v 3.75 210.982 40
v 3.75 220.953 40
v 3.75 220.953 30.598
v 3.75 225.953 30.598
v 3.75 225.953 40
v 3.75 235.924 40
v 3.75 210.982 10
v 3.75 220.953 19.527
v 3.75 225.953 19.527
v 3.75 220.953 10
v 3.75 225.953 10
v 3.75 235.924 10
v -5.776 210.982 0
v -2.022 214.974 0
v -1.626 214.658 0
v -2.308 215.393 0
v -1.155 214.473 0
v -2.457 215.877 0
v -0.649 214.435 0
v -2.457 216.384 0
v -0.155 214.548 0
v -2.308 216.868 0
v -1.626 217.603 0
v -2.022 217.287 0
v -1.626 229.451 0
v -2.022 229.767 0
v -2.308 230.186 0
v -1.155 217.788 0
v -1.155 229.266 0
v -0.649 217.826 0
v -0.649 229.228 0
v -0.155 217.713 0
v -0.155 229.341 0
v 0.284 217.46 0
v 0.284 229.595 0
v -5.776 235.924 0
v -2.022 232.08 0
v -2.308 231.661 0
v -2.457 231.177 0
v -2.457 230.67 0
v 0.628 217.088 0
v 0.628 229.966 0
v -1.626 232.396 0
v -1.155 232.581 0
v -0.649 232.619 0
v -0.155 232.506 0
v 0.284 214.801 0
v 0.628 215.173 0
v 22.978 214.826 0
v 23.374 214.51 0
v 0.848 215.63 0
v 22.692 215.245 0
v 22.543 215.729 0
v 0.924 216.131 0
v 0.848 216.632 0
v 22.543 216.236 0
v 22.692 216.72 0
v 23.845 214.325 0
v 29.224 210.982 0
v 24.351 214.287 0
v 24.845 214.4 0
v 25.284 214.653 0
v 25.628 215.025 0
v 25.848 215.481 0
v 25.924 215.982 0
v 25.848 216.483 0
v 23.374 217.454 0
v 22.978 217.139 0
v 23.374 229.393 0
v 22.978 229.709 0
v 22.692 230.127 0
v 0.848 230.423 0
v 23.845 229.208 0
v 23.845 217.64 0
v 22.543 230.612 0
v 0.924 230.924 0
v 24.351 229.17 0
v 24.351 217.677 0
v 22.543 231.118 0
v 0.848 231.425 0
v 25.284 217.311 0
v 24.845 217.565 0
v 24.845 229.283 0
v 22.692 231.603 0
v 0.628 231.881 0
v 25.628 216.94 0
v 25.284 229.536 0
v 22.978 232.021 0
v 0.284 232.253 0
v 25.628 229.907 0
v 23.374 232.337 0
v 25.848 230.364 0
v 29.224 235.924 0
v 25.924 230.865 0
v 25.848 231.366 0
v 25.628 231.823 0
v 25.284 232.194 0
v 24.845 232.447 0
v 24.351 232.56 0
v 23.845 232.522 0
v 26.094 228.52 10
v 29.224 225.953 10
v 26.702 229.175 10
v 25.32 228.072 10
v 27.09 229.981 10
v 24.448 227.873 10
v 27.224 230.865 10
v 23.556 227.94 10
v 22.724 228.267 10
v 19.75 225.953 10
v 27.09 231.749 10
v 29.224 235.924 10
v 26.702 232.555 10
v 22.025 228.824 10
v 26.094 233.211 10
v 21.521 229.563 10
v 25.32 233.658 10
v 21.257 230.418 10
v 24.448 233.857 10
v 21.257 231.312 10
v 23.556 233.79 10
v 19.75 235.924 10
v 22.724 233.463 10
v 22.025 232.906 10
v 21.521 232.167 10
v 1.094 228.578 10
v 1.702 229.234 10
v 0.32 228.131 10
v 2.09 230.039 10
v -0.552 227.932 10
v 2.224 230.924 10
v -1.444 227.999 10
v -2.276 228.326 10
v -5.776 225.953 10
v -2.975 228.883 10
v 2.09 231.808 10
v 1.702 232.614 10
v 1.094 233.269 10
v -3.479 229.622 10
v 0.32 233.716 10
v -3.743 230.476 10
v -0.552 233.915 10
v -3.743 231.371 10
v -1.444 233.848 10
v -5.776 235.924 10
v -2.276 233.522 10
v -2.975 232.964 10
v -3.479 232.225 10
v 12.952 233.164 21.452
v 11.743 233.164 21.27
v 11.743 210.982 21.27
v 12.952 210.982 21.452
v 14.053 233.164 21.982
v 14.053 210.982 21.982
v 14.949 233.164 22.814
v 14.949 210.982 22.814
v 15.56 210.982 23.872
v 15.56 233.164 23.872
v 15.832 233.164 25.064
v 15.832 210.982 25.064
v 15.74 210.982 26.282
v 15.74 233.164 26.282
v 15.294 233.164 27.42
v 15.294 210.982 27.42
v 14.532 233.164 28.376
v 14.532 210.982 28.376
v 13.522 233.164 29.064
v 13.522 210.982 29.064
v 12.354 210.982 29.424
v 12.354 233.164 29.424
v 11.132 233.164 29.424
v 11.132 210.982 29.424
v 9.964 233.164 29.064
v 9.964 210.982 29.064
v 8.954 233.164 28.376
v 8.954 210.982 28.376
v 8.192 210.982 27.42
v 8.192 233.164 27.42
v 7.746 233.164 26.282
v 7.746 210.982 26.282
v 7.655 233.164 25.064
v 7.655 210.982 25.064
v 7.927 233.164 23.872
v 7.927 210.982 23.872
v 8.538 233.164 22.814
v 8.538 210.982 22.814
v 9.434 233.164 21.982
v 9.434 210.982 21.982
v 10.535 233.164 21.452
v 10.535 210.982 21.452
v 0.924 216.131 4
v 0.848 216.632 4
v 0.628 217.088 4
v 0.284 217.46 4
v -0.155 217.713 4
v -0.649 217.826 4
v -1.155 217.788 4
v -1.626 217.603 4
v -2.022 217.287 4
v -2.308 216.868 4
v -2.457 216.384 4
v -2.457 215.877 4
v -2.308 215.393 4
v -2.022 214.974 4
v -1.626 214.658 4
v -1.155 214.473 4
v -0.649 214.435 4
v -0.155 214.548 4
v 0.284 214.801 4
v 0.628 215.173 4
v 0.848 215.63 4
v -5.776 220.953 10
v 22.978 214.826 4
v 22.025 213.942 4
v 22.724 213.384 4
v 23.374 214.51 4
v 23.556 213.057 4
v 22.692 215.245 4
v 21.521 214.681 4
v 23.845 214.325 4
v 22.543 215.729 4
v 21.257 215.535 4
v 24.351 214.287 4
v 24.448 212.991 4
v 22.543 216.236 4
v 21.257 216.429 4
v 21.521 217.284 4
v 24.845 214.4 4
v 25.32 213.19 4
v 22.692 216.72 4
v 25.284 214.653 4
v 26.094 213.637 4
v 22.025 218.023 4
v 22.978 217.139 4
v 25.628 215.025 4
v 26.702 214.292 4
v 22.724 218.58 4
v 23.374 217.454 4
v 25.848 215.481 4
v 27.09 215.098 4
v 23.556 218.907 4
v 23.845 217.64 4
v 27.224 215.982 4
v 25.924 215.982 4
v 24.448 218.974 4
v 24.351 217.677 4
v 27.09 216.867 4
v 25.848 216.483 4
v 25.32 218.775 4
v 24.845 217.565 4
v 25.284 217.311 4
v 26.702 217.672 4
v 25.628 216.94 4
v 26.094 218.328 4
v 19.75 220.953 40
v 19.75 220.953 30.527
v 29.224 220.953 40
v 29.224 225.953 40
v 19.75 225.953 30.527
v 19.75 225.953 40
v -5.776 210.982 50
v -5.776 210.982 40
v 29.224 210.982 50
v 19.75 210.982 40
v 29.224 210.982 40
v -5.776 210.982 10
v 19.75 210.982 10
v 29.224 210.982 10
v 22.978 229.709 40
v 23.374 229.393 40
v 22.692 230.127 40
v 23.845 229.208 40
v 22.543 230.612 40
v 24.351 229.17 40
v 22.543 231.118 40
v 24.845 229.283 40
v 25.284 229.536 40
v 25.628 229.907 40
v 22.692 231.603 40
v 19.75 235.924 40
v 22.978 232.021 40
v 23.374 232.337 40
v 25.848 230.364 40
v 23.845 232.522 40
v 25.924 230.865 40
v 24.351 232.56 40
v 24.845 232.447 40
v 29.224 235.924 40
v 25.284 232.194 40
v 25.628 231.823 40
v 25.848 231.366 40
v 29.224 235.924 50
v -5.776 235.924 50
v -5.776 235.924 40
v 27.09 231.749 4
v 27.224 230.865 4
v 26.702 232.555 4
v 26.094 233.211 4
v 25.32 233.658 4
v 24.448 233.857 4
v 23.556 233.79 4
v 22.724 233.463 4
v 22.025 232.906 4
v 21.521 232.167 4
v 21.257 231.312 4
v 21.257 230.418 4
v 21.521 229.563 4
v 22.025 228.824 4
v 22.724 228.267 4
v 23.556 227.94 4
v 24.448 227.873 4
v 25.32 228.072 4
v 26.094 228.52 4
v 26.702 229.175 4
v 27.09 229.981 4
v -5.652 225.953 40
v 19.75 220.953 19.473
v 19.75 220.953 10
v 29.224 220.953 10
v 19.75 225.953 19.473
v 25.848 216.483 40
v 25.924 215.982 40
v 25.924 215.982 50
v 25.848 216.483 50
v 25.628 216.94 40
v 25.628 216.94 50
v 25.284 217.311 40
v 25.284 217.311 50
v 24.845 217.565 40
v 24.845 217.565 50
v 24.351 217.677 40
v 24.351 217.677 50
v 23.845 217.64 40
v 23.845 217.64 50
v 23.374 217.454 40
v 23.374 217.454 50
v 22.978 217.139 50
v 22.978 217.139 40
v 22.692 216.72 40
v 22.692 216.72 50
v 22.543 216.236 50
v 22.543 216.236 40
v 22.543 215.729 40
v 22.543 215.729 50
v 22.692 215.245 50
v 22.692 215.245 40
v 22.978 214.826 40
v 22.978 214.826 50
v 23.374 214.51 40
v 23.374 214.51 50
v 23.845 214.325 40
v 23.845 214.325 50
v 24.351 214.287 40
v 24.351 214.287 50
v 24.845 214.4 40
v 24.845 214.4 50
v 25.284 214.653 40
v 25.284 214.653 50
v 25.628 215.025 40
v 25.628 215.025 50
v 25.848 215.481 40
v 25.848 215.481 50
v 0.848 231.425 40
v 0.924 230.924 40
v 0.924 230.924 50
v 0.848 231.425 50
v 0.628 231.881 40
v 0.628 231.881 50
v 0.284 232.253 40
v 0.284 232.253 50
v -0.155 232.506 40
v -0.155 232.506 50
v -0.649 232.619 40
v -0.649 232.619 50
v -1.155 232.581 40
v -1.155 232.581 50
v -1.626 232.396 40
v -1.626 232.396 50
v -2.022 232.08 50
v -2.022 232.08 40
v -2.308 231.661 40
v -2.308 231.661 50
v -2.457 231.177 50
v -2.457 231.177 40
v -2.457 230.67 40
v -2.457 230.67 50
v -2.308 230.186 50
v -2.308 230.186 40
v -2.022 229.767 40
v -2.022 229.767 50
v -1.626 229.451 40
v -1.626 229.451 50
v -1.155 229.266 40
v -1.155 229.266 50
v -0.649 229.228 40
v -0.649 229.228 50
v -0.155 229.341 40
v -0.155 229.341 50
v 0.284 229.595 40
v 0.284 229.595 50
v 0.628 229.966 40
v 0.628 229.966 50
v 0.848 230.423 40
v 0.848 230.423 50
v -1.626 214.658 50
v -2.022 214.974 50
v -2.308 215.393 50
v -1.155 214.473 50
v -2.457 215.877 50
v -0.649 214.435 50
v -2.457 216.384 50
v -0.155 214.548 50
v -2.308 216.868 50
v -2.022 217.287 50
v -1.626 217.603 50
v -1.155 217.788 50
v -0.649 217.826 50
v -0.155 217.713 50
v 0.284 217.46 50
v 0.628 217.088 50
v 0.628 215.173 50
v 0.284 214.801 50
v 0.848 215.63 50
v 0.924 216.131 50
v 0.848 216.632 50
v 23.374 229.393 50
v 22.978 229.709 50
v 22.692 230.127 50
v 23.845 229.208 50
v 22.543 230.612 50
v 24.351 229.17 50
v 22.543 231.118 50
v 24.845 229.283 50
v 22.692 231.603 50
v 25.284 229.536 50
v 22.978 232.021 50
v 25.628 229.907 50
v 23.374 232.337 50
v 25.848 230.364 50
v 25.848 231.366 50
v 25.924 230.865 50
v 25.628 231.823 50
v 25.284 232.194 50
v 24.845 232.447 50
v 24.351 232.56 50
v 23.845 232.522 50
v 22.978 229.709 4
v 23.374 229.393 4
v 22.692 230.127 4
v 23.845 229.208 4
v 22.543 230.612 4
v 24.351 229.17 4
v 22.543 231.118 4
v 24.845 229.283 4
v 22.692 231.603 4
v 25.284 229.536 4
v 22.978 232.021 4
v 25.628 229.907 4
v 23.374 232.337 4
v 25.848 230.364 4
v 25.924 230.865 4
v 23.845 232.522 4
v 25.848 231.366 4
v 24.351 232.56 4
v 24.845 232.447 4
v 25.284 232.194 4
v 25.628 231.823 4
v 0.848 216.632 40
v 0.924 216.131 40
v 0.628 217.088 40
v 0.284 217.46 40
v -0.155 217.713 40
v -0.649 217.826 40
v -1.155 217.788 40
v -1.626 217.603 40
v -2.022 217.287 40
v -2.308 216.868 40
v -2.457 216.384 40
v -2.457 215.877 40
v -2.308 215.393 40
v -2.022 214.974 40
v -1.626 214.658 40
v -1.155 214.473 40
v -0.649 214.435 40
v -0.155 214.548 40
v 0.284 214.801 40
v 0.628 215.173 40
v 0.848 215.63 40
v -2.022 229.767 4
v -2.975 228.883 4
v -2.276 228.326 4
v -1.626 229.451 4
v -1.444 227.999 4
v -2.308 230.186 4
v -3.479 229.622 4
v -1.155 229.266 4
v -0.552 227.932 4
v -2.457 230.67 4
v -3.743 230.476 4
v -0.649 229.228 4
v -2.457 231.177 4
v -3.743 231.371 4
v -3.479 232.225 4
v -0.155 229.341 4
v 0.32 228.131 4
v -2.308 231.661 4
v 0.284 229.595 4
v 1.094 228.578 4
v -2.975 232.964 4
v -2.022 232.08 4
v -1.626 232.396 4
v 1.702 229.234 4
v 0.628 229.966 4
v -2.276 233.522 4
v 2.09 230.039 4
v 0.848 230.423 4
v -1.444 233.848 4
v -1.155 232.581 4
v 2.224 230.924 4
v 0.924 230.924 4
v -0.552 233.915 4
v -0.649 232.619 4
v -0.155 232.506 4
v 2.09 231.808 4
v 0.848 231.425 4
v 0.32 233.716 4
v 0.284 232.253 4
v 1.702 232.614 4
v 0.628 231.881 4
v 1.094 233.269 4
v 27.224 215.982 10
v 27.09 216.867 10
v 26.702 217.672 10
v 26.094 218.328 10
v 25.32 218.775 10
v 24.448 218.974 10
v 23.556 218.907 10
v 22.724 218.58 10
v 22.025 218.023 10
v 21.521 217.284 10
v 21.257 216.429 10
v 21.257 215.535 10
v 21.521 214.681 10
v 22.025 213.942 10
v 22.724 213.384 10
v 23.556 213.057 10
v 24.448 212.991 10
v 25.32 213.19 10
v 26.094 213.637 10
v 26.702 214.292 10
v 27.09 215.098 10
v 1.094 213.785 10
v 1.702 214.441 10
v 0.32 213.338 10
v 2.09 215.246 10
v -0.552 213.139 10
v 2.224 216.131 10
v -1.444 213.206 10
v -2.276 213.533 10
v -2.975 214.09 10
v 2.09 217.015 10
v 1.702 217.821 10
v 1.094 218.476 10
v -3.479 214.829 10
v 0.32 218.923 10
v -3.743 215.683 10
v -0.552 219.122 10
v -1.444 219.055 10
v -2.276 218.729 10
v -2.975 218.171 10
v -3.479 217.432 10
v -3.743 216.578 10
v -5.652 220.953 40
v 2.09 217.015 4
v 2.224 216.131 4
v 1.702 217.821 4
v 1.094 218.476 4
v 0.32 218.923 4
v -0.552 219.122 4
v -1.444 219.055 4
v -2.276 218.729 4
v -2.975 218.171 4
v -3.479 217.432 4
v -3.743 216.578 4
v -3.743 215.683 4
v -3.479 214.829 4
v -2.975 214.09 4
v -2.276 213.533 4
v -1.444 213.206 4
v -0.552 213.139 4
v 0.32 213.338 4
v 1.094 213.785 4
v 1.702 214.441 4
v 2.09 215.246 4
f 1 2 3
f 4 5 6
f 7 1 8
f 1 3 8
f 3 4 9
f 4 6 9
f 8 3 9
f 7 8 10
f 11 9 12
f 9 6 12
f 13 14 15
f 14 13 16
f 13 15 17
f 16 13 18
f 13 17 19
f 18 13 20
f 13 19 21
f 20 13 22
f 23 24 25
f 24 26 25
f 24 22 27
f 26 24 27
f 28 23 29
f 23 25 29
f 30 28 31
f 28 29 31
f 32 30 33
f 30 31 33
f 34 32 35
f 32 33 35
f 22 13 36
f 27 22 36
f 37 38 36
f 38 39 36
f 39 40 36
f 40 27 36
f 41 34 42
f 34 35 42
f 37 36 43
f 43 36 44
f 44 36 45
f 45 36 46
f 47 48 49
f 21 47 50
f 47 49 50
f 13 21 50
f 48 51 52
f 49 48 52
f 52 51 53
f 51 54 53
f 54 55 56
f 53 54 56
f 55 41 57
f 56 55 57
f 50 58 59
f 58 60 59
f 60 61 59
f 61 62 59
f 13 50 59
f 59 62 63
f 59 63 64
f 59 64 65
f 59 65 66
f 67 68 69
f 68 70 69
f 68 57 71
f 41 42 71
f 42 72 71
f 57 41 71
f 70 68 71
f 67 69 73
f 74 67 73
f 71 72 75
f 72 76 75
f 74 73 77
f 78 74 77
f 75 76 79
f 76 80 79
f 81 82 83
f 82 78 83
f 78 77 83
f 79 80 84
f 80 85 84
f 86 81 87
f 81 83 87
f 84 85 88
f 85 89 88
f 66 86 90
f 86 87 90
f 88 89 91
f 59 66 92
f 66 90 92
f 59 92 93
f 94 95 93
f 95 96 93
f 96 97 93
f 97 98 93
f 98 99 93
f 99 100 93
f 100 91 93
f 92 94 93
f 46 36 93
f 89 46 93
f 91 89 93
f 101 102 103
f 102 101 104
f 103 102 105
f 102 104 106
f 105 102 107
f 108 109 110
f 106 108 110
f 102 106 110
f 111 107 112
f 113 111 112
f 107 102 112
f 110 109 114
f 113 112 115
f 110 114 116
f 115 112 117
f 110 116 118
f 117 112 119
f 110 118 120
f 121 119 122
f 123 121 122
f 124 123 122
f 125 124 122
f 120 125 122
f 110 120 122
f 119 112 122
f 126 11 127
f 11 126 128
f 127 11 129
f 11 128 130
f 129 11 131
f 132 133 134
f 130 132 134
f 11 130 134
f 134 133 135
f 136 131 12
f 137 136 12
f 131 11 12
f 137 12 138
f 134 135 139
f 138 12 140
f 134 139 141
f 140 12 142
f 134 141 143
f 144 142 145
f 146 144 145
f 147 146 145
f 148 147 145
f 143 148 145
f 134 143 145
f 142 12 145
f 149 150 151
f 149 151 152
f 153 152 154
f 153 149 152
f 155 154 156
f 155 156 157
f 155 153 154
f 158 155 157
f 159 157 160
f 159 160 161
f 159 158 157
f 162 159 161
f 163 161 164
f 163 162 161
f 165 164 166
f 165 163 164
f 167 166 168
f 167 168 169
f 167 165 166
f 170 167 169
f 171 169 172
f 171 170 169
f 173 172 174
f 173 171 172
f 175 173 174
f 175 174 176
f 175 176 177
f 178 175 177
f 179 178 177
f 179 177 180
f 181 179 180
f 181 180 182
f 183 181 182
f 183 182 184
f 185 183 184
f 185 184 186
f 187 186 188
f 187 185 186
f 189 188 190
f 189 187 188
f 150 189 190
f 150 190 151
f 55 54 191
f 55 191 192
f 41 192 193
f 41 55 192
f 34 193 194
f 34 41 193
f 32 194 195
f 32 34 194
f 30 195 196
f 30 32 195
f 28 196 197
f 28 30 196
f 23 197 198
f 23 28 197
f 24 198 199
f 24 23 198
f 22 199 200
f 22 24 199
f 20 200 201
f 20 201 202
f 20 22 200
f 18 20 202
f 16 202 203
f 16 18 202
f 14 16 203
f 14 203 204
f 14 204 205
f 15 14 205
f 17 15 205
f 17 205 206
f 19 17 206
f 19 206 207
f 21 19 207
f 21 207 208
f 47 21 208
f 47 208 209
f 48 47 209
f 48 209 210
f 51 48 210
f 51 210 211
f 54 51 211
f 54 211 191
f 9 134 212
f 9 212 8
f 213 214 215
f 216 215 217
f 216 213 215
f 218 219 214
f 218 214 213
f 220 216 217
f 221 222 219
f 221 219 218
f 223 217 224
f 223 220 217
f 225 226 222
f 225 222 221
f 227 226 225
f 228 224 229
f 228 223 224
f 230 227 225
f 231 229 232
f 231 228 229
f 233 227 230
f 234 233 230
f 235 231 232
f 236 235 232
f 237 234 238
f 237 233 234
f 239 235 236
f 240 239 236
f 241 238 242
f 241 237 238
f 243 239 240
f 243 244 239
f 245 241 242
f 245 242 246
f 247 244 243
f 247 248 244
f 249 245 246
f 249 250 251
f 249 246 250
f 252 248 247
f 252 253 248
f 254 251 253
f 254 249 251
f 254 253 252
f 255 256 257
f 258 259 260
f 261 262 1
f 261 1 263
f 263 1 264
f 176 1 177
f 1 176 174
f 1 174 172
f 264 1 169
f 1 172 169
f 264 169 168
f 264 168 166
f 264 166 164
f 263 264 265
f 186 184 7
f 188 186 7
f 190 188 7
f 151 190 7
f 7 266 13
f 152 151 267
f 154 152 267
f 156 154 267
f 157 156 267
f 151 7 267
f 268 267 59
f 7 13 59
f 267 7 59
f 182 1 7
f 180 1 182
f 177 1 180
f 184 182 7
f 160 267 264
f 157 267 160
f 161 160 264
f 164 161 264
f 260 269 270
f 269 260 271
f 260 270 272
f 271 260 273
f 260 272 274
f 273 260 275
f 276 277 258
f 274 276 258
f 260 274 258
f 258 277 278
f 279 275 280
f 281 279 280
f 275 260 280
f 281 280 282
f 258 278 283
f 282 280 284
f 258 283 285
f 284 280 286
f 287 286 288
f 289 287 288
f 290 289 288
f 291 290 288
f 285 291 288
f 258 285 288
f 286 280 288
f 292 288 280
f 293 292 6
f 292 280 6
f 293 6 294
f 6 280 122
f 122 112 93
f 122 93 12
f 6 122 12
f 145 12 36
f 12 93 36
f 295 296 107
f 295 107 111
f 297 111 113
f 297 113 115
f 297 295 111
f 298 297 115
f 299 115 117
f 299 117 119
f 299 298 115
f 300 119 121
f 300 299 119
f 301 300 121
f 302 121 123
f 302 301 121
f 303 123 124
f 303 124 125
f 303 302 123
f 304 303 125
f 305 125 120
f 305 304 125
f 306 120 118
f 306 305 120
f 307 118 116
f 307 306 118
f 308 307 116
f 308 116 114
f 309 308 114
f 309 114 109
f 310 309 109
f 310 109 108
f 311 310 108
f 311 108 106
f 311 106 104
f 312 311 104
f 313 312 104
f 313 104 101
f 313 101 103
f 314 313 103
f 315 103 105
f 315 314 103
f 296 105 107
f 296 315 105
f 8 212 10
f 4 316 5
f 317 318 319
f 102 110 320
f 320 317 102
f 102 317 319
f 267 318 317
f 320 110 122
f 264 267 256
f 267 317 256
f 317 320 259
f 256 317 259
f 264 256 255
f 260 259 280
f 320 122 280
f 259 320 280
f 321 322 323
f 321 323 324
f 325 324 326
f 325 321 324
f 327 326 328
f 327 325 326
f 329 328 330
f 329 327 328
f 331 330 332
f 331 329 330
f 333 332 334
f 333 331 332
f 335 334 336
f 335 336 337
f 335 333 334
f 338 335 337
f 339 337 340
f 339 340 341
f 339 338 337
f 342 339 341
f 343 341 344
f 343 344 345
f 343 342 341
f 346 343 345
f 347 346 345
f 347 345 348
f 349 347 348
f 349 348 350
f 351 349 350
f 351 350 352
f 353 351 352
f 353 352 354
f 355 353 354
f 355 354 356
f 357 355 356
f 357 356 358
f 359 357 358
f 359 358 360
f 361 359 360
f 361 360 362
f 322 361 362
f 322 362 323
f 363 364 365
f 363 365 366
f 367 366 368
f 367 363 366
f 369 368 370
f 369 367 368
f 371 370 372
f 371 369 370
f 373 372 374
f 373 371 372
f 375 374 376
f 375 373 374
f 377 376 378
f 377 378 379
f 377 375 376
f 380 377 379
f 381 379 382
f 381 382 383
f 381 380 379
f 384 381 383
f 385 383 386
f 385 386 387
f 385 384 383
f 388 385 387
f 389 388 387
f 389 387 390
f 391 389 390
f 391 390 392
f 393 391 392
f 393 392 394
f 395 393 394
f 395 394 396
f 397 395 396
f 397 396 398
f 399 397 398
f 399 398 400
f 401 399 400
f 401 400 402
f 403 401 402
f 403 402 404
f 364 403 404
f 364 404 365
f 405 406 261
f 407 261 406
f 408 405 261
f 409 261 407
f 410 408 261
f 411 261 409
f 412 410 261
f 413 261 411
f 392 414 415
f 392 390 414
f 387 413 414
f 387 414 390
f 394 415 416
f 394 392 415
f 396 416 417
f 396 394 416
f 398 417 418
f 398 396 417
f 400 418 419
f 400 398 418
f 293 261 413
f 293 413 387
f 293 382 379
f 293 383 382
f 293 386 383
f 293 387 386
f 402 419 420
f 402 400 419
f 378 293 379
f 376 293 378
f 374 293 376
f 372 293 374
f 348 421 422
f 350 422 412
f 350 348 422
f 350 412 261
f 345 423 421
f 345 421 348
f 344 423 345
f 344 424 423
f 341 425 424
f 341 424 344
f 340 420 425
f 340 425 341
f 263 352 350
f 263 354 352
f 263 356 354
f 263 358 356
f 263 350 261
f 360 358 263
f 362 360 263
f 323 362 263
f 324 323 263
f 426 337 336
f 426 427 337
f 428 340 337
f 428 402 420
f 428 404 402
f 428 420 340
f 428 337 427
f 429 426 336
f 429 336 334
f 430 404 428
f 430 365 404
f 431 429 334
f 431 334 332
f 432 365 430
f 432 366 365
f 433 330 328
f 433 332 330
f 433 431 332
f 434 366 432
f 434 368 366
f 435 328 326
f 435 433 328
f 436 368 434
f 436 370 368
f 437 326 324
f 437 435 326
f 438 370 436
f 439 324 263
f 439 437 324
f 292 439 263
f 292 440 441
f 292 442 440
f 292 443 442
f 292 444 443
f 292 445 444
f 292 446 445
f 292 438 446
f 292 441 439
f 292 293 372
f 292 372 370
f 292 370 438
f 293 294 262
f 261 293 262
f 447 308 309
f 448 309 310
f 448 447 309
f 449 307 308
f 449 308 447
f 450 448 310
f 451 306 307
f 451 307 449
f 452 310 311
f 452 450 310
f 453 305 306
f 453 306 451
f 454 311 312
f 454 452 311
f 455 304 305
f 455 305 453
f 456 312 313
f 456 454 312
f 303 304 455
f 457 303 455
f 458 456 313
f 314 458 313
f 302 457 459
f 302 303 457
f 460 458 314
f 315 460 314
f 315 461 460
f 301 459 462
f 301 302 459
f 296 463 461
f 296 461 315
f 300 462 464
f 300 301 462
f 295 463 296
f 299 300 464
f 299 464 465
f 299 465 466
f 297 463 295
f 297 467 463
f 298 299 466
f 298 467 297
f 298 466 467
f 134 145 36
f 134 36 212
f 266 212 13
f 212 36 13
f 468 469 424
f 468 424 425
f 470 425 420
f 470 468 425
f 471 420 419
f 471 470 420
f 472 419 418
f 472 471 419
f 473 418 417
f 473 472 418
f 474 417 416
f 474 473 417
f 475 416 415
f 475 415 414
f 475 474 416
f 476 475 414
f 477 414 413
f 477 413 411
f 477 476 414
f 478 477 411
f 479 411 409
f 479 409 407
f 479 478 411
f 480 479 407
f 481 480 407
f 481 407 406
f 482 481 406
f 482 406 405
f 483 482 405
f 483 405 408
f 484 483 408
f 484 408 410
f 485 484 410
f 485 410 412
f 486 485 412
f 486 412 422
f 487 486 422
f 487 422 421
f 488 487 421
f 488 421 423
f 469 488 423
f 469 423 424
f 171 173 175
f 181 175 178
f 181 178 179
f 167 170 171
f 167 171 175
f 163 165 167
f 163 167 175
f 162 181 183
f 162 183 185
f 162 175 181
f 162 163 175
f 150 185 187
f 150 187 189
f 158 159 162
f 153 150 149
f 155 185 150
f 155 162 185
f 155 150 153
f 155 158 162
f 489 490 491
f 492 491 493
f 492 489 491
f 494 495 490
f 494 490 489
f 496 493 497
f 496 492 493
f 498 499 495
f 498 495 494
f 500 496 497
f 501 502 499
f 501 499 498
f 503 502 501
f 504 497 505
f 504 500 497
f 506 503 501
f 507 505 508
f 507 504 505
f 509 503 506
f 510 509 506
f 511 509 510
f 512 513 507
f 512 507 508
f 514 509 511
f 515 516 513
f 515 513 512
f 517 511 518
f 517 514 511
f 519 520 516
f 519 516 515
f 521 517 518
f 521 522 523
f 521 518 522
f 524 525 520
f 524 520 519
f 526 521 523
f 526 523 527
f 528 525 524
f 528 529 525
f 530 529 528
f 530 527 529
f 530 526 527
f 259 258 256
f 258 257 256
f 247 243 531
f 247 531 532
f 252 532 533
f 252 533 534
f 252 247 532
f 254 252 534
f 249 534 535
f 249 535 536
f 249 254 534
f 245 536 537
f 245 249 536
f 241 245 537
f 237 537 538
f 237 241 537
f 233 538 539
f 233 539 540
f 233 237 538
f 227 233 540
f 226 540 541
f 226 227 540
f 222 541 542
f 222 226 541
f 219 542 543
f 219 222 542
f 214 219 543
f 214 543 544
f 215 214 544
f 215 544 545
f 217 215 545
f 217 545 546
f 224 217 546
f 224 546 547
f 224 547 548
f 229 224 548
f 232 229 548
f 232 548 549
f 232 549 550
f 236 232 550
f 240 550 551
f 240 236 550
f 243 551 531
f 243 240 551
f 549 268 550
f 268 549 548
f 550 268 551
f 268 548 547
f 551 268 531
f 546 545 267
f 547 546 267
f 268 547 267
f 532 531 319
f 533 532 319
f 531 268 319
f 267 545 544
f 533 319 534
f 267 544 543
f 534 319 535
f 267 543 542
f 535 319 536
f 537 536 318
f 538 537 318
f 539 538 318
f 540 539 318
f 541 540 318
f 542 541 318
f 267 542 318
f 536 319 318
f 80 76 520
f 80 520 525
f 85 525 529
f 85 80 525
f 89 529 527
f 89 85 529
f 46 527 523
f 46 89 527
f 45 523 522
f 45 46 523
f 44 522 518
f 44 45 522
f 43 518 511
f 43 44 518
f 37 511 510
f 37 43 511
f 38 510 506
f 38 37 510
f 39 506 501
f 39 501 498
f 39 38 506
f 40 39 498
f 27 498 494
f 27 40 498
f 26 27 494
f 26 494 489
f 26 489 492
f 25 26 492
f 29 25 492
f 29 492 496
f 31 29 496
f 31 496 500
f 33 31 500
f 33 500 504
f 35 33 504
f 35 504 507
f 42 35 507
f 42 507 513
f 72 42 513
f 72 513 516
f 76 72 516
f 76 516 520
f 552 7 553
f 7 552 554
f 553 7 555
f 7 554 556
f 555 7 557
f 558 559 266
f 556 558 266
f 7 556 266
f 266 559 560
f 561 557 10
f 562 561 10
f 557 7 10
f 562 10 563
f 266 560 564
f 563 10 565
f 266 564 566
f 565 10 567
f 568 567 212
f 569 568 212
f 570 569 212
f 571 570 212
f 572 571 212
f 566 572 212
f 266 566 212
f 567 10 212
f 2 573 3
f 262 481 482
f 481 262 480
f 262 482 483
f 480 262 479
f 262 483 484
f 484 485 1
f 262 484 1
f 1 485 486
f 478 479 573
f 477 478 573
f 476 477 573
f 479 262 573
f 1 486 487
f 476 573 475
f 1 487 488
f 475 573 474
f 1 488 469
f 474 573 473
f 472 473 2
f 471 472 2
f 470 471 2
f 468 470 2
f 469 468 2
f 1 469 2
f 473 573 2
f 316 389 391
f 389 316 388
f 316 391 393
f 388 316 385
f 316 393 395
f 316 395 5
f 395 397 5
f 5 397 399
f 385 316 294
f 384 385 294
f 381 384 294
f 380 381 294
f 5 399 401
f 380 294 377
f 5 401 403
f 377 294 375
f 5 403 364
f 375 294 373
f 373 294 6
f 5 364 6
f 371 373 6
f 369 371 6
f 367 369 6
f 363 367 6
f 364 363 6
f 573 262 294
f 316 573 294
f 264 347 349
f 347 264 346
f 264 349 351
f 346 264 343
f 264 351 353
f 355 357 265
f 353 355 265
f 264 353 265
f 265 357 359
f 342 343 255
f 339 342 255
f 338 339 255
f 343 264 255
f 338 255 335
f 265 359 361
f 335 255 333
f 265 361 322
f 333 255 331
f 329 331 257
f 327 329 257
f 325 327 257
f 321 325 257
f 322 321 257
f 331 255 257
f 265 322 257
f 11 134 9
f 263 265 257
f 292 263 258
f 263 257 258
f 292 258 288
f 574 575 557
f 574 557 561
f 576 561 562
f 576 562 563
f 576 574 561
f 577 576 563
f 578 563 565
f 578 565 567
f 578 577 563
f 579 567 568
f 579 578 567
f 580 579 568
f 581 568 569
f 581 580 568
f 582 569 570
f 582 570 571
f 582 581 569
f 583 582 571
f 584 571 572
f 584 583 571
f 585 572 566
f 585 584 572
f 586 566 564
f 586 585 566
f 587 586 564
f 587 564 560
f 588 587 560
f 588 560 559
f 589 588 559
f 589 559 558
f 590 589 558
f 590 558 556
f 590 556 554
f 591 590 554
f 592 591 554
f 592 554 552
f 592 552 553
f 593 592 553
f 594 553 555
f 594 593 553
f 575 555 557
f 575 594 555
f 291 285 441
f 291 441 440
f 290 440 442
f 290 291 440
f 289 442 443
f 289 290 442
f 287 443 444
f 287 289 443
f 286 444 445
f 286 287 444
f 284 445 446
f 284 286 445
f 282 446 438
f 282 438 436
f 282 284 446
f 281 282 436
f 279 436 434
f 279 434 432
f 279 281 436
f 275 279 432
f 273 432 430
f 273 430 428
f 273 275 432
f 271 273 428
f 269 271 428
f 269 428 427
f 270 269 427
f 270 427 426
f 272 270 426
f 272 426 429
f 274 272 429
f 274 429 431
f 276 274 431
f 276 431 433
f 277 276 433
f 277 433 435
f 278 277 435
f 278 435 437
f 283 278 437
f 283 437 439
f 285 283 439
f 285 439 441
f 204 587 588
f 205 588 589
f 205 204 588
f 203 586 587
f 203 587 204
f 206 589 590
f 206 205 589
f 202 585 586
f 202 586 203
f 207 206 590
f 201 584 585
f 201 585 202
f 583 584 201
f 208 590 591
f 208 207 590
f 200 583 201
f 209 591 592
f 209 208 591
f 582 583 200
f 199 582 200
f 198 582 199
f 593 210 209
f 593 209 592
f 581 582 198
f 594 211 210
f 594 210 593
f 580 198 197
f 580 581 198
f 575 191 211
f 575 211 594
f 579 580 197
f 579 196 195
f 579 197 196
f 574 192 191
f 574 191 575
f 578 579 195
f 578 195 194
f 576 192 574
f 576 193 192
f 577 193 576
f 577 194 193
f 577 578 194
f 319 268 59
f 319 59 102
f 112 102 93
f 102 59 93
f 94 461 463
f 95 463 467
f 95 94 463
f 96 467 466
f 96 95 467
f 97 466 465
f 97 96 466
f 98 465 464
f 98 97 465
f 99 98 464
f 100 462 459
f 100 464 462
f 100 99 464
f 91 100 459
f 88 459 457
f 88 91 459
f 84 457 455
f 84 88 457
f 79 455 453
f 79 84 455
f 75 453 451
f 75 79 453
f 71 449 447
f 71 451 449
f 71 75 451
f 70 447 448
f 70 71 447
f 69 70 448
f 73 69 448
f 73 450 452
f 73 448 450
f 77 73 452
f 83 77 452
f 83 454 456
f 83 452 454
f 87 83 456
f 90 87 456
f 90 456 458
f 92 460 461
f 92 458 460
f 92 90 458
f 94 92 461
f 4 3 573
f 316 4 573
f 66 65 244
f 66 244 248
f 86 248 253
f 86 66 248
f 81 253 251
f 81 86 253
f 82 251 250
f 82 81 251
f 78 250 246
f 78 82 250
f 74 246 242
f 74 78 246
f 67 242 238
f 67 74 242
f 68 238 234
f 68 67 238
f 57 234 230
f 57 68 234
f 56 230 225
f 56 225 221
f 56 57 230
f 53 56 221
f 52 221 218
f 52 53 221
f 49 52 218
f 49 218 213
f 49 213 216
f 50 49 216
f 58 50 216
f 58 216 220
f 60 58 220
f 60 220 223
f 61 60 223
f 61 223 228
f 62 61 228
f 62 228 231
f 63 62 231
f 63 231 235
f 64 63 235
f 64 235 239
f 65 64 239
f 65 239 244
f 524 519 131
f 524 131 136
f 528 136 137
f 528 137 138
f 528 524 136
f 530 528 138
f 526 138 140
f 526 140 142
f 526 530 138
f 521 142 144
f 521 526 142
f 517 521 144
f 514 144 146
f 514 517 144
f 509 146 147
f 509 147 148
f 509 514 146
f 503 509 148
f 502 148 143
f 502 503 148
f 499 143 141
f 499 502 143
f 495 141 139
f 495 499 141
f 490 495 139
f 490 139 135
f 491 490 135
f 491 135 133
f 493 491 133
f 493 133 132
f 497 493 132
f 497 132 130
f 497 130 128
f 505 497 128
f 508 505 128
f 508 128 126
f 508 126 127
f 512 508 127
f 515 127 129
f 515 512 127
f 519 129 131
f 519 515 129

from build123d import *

# Parameters (mm, degrees)
SKETCH2_R           = 1.7
BOSS_EXTRUDE1_DEPTH = 50
CUT_EXTRUDE1_DEPTH  = 51
CUT_EXTRUDE2_START  = -22.181644
SKETCH4_R           = 4.1
CUT_EXTRUDE2_DEPTH  = 22.181644
CUT_EXTRUDE3_START  = -6
SKETCH6_R           = 3
SKETCH6_R_2         = 1.7
CUT_EXTRUDE3_DEPTH  = 6
BOSS_EXTRUDE2_DEPTH = 2.5


with BuildPart() as part:
    # Sketch2 → Boss-Extrude1 (new body)
    with BuildSketch(Plane.XY):
        Polygon((29.223766163, 230.865012057), (29.223766163, 235.92362241), (24.223766163, 235.92362241), (-0.776233837, 235.92362241), (-5.776233837, 235.92362241), (-5.776233837, 230.92362241), (-5.776233837, 210.982238102), (24.223766163, 210.982238102), (29.223766163, 210.982238102), (29.223766163, 215.982238102), align=None)
        with Locations((-0.776233837, 216.130599455)):
            Circle(SKETCH2_R, mode=Mode.SUBTRACT)
        with Locations((24.223766163, 215.982238102)):
            Circle(SKETCH2_R, mode=Mode.SUBTRACT)
        with Locations((-0.776233837, 230.92362241)):
            Circle(SKETCH2_R, mode=Mode.SUBTRACT)
        with Locations((24.223766163, 230.865012057)):
            Circle(SKETCH2_R, mode=Mode.SUBTRACT)
    extrude(amount=BOSS_EXTRUDE1_DEPTH)

    # Sketch3 → Cut-Extrude1 (cut)
    with BuildSketch(Plane(origin=(0, 235.92362241, 0), x_dir=(1, 0, 0), z_dir=(0, 1, 0))):
        Polygon((3.750473292, -40), (3.750473292, -27), (3.750473292, -10), (-5.776233837, -10), (-5.776233837, -40), align=None)
        Polygon((29.223766163, -10), (19.750473292, -10), (19.750473292, -27), (19.750473292, -40), (29.223766163, -40), align=None)
    extrude(amount=-CUT_EXTRUDE1_DEPTH, mode=Mode.SUBTRACT)

    # Sketch4 → Cut-Extrude2 (cut)
    with BuildSketch(Plane.XZ.offset(-210.982238102).offset(CUT_EXTRUDE2_START)):
        with Locations(Location((11.743125017, 25.37, 0), (0, 0, 270))):
            Circle(SKETCH4_R)
    extrude(amount=CUT_EXTRUDE2_DEPTH, mode=Mode.SUBTRACT)

    # Sketch6 → Cut-Extrude3 (cut)
    # profile 1 of 4: a face of its own
    with BuildSketch(Plane.XY.offset(10).offset(CUT_EXTRUDE3_START)):
        with Locations((24.223766163, 230.865012057)):
            Circle(SKETCH6_R)
    # profile 2 of 4: a face of its own
    with BuildSketch(Plane.XY.offset(10).offset(CUT_EXTRUDE3_START)):
        with Locations((24.223766163, 215.982238102)):
            Circle(SKETCH6_R)
        with Locations((24.223766163, 215.982238102)):
            Circle(SKETCH6_R_2, mode=Mode.SUBTRACT)
    # profile 3 of 4: a face of its own
    with BuildSketch(Plane.XY.offset(10).offset(CUT_EXTRUDE3_START)):
        with Locations((-0.776233837, 216.130599455)):
            Circle(SKETCH6_R)
        with Locations((-0.776233837, 216.130599455)):
            Circle(SKETCH6_R_2, mode=Mode.SUBTRACT)
    # profile 4 of 4: a face of its own
    with BuildSketch(Plane.XY.offset(10).offset(CUT_EXTRUDE3_START)):
        with Locations((-0.776233837, 230.92362241)):
            Circle(SKETCH6_R)
        with Locations((-0.776233837, 230.92362241)):
            Circle(SKETCH6_R_2, mode=Mode.SUBTRACT)
    extrude(amount=CUT_EXTRUDE3_DEPTH, mode=Mode.SUBTRACT)

    # Sketch8 → Boss-Extrude2 (add, symmetric)
    with BuildSketch(Plane(origin=(0, 223.452930256, 0), x_dir=(1, 0, 0), z_dir=(0, 1, 0))):
        Polygon((3.750473292, -30.597830669), (-5.651696039, -40), (3.750473292, -40), align=None)
        Polygon((19.750473292, -40), (29.223766163, -40), (19.750473292, -30.52670713), align=None)
        Polygon((19.750473292, -10), (19.750473292, -19.47329287), (29.223766163, -10), align=None)
        Polygon((3.750473292, -10), (-5.776233837, -10), (3.750473292, -19.52670713), align=None)
    extrude(amount=BOSS_EXTRUDE2_DEPTH, both=True)


solid = part.part
